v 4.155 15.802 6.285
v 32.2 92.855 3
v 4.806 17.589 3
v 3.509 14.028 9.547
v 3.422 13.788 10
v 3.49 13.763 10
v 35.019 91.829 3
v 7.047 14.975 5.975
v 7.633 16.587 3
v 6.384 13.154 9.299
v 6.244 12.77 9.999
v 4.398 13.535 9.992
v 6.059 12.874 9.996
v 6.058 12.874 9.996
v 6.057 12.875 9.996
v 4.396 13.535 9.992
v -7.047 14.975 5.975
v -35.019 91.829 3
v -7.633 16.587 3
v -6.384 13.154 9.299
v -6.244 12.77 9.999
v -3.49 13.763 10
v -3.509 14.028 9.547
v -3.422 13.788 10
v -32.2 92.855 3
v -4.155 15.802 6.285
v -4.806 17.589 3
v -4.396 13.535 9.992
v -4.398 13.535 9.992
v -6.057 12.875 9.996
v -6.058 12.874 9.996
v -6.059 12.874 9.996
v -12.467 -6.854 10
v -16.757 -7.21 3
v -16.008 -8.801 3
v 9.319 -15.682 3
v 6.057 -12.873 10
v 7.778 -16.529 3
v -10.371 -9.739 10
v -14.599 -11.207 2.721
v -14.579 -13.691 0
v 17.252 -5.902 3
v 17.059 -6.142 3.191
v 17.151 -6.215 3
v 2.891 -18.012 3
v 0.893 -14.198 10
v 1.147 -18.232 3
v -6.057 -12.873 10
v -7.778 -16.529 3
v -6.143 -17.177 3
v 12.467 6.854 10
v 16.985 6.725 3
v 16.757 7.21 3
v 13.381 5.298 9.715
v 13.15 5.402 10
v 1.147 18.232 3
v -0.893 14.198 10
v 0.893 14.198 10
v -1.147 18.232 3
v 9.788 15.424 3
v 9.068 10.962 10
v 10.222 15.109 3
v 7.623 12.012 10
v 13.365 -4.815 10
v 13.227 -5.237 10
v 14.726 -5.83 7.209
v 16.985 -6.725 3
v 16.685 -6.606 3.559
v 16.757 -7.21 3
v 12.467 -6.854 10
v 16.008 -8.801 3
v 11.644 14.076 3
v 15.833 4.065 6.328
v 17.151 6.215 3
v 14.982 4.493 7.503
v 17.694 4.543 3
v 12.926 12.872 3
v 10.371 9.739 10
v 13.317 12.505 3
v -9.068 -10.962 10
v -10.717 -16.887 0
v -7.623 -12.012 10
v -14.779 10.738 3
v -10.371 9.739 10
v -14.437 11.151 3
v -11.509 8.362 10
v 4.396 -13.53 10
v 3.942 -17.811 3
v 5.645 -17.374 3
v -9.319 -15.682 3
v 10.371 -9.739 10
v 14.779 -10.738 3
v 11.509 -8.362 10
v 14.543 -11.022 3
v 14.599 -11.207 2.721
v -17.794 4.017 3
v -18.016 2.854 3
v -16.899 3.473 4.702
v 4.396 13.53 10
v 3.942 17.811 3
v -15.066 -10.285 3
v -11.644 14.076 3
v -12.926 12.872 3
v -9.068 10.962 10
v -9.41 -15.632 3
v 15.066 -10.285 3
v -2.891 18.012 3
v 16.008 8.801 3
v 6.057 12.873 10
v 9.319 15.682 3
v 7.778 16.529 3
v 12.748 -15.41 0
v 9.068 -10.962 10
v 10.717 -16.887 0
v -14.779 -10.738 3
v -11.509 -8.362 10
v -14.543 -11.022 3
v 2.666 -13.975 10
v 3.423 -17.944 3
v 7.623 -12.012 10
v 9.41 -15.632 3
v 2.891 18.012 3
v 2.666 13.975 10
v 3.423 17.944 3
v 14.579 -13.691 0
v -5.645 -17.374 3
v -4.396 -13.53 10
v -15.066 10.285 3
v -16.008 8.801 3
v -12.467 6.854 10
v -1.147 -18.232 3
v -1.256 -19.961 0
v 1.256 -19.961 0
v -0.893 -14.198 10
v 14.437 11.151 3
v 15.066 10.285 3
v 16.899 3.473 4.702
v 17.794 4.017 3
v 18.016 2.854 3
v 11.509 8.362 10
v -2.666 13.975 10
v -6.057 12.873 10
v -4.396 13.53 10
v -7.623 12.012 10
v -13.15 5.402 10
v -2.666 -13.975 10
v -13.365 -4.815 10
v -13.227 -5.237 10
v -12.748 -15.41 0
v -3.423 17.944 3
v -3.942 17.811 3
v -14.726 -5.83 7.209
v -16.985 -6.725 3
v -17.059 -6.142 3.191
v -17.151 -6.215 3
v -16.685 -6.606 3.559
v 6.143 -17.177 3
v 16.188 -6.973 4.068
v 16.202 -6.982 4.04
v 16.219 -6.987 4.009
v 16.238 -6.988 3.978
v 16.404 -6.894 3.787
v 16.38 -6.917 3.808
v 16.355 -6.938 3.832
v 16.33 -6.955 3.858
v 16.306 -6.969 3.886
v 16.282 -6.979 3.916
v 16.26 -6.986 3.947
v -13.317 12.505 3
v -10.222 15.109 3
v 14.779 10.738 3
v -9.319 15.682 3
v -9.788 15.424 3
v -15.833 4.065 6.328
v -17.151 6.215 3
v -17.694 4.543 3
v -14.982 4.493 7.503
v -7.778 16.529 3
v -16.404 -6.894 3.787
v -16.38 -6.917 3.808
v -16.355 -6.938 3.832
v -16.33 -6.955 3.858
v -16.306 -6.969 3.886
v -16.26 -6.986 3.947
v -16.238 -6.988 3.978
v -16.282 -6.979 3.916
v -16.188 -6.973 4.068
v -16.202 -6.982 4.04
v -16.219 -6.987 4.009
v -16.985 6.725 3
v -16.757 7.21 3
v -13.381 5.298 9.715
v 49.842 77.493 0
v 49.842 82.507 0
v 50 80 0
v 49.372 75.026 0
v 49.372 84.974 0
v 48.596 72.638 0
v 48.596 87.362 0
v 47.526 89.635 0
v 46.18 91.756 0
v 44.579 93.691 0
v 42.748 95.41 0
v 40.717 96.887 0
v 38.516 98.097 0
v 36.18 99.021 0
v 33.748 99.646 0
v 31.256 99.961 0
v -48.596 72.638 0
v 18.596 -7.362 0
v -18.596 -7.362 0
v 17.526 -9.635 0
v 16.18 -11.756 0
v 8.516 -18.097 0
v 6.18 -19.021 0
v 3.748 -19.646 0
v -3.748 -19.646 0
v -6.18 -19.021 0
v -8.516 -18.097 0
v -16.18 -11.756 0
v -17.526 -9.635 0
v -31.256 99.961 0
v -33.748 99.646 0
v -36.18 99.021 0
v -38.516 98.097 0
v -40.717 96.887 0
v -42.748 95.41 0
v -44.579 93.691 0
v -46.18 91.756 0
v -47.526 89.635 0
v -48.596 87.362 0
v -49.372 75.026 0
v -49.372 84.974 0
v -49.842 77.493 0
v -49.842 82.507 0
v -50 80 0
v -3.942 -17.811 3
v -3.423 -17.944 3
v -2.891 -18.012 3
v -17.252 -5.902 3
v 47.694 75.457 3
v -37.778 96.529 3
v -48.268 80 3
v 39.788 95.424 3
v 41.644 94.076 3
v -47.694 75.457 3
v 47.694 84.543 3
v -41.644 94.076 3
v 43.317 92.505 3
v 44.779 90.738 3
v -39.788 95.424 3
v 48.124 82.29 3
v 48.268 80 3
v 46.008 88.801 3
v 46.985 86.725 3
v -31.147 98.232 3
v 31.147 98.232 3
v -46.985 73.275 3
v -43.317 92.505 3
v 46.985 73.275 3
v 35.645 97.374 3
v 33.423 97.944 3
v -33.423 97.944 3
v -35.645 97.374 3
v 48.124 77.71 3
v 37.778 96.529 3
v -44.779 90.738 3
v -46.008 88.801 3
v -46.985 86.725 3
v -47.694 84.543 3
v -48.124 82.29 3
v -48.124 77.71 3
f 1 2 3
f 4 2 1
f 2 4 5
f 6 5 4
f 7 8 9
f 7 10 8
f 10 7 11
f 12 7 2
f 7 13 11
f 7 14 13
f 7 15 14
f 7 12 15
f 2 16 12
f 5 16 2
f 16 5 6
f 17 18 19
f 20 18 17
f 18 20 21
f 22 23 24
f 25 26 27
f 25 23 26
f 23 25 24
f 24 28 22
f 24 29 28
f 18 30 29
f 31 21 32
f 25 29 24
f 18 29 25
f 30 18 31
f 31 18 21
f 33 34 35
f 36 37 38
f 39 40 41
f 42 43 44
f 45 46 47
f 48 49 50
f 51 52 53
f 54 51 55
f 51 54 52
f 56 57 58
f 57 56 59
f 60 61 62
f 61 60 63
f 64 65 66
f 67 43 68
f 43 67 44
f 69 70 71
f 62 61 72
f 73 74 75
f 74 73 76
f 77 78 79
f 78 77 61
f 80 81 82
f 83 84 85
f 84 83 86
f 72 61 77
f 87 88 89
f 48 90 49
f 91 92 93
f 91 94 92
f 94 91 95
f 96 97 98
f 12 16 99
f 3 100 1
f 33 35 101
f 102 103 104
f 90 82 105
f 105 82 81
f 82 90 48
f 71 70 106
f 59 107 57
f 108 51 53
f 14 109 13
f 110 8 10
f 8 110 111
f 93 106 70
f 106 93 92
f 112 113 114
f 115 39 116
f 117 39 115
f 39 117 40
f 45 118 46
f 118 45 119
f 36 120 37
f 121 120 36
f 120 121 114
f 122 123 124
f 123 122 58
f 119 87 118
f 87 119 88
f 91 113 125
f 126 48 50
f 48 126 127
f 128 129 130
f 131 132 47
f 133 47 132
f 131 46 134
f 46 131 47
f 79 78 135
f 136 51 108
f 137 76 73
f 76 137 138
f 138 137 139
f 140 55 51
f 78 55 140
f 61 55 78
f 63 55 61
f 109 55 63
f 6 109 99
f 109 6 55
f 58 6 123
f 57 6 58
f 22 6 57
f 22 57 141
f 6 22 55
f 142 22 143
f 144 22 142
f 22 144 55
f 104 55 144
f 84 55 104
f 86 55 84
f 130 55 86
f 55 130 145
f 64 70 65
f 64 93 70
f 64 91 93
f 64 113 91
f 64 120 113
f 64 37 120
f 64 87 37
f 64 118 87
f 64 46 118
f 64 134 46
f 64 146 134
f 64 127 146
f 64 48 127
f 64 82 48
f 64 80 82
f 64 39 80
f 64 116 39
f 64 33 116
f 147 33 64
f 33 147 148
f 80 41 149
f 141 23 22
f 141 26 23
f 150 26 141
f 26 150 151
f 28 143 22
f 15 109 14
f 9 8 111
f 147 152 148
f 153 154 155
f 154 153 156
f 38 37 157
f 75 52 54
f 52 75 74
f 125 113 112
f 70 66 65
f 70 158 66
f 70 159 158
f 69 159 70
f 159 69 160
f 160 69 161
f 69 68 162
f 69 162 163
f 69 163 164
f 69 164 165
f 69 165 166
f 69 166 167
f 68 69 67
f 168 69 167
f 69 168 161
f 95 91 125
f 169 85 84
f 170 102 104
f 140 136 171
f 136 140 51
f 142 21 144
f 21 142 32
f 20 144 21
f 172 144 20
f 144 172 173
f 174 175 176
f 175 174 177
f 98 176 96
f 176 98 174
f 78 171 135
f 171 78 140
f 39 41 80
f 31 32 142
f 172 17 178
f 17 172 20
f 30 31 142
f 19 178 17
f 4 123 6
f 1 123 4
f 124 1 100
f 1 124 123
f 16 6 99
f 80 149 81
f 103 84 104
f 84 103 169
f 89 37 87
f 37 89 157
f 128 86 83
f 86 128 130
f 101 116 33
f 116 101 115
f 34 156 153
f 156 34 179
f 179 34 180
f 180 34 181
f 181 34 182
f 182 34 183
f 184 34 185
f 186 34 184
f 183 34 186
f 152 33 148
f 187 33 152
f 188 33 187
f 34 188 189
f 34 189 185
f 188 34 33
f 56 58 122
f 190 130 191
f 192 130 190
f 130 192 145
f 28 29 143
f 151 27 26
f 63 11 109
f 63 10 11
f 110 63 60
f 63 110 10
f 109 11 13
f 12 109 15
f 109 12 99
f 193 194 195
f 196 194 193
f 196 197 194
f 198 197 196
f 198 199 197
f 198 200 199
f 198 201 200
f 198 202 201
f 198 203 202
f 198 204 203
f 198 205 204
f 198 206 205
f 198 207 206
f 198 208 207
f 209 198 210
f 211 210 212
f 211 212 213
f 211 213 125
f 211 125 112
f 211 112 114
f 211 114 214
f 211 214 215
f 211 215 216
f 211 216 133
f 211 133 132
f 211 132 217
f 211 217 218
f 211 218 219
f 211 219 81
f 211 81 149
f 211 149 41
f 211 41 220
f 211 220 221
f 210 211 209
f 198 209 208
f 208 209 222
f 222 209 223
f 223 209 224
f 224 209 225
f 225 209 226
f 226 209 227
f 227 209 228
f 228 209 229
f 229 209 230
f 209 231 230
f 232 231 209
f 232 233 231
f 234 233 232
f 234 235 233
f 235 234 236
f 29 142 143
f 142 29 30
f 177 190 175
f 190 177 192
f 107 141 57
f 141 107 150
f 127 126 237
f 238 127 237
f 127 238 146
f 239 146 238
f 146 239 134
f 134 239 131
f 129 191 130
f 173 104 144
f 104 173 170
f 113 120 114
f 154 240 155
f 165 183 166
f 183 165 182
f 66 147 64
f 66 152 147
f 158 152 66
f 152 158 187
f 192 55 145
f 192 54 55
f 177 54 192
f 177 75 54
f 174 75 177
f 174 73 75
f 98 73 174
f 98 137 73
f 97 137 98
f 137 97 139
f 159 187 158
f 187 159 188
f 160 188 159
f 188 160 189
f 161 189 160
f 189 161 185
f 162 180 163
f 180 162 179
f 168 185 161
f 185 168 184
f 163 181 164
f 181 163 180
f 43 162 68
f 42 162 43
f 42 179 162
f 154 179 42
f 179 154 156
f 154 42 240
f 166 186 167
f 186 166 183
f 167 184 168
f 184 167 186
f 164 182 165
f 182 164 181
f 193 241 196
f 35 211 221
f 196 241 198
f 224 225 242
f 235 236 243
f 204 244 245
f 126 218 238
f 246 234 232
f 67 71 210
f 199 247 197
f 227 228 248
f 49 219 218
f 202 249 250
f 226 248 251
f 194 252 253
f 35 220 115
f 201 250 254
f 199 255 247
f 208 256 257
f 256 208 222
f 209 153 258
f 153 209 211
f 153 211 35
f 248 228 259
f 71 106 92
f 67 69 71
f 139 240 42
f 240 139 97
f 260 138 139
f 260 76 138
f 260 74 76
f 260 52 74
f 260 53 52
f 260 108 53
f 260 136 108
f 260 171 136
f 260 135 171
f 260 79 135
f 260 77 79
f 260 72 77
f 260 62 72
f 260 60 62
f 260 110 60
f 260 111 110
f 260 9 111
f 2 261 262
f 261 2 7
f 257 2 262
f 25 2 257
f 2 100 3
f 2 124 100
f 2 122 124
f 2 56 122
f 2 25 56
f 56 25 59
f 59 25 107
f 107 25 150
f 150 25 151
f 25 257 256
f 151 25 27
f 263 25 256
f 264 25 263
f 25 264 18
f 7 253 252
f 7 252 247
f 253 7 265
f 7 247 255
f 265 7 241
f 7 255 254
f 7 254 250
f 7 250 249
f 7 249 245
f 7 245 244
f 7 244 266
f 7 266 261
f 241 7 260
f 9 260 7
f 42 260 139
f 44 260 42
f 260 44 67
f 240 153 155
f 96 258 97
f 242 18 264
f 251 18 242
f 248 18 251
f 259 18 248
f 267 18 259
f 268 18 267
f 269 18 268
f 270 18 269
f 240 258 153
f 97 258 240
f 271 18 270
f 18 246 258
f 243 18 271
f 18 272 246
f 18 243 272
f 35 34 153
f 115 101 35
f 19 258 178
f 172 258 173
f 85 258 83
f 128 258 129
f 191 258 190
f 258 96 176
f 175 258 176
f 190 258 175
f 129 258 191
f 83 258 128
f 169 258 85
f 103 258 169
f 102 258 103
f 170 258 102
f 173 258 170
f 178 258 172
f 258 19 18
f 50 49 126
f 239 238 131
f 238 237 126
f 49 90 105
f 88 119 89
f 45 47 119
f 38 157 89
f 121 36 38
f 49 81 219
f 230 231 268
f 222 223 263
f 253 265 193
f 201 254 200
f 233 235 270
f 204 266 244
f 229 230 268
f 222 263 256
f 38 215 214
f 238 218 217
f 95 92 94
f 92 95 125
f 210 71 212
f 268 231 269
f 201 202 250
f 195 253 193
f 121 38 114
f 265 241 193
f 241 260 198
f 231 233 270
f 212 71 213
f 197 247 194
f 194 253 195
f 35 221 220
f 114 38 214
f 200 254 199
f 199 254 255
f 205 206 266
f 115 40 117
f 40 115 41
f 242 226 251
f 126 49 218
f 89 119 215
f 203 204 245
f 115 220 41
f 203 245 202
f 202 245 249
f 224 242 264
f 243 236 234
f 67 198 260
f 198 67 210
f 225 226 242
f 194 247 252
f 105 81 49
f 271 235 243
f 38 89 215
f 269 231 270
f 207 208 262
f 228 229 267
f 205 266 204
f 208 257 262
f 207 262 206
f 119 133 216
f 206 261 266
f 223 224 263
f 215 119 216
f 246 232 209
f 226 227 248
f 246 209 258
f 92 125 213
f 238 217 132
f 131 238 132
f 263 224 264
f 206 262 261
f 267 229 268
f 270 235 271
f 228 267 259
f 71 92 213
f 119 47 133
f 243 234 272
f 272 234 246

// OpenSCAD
$fn=50;


/* [Dimensions] */
ttDia=40;
ttHght=10;
monOffset=[0,-5.5,3];
baseThick=3;
monTilt=20;
monOvDims=[192+187,235.5,9.5];;

spcng=0.25;

/* [Hidden] */
fudge=0.1;

turnTable();

*5translate(monOffset) rotate([-monTilt,0,0]) 
  translate([0,8,235.5/2]) rotate([90,0,0]) USBMon();

module turnTable(){
  flankAng=30;
  ttDia2=ttDia-(tan(flankAng)*ttHght)*2; //turntable upper Dia from flankAng
  basDia2=ttDia-(tan(flankAng)*baseThick)*2; //base upper Dia from flanAng
  
  YFudge= fudge/tan(flankAng);//fudge from flank Ang
  yDist= 100;//tan(monTilt)*monOvDims.y; //tan a = GK/AK
  beamPoly=[[basDia2/2-fudge,baseThick-YFudge],
            [yDist-(ttDia-basDia2)/2,baseThick],
            [ttDia2/2-fudge,ttHght]];
  
  monShapePoly=[[0,0],
                [1.5,0.5],[1.5,ttHght*2],
                [-7.6,ttHght*2],[-7.6,5.5/2]]; //section of usb Monitor for cutout
  
  *polygon(monShapePoly);
  
  for (ir=[-1,1]) rotate([90,0,90+ir*monTilt]) linear_extrude(3,center=true) polygon(beamPoly);
  hull(){ //the actual stand
    cylinder(d1=ttDia, d2=basDia2,h=baseThick);
    for (ix=[-1,1])
      translate([ix*(yDist-ttDia)/2,yDist-ttDia/2]) 
        cylinder(d1=ttDia,d2=basDia2,h=baseThick);
  }
  // the holder disc
  difference(){
    cylinder(d1=ttDia,d2=ttDia2, h=ttHght);
    translate(monOffset)
      rotate([90,-monTilt,-90]) linear_extrude(ttDia+fudge,center=true) 
        offset(spcng) polygon(monShapePoly);
  }
}

module USBMon(){
  backDim=[196+178,230];
  midDim=[192+187,235.5,8];
  frontDim=midDim-[1,1,6.5];
  backRad=2;
  midRad=(midDim.x-backDim.x)/2;
  sclMid=[midDim.x/backDim.x,midDim.y/backDim.y];
  sclFrnt=[frontDim.x/midDim.x,frontDim.y/midDim.y];
  
  linear_extrude(height=midDim.z,scale=sclMid) hull() for (ix=[-1,1],iy=[-1,1])
    translate([ix*(backDim.x/2-backRad),iy*(backDim.y/2-backRad)]) circle(backRad);
  translate([0,0,midDim.z]) linear_extrude(height=frontDim.z,scale=sclFrnt) 
    hull() for (ix=[-1,1],iy=[-1,1])
      translate([ix*(midDim.x/2-backRad),iy*(midDim.y/2-backRad)]) circle(backRad);
}
